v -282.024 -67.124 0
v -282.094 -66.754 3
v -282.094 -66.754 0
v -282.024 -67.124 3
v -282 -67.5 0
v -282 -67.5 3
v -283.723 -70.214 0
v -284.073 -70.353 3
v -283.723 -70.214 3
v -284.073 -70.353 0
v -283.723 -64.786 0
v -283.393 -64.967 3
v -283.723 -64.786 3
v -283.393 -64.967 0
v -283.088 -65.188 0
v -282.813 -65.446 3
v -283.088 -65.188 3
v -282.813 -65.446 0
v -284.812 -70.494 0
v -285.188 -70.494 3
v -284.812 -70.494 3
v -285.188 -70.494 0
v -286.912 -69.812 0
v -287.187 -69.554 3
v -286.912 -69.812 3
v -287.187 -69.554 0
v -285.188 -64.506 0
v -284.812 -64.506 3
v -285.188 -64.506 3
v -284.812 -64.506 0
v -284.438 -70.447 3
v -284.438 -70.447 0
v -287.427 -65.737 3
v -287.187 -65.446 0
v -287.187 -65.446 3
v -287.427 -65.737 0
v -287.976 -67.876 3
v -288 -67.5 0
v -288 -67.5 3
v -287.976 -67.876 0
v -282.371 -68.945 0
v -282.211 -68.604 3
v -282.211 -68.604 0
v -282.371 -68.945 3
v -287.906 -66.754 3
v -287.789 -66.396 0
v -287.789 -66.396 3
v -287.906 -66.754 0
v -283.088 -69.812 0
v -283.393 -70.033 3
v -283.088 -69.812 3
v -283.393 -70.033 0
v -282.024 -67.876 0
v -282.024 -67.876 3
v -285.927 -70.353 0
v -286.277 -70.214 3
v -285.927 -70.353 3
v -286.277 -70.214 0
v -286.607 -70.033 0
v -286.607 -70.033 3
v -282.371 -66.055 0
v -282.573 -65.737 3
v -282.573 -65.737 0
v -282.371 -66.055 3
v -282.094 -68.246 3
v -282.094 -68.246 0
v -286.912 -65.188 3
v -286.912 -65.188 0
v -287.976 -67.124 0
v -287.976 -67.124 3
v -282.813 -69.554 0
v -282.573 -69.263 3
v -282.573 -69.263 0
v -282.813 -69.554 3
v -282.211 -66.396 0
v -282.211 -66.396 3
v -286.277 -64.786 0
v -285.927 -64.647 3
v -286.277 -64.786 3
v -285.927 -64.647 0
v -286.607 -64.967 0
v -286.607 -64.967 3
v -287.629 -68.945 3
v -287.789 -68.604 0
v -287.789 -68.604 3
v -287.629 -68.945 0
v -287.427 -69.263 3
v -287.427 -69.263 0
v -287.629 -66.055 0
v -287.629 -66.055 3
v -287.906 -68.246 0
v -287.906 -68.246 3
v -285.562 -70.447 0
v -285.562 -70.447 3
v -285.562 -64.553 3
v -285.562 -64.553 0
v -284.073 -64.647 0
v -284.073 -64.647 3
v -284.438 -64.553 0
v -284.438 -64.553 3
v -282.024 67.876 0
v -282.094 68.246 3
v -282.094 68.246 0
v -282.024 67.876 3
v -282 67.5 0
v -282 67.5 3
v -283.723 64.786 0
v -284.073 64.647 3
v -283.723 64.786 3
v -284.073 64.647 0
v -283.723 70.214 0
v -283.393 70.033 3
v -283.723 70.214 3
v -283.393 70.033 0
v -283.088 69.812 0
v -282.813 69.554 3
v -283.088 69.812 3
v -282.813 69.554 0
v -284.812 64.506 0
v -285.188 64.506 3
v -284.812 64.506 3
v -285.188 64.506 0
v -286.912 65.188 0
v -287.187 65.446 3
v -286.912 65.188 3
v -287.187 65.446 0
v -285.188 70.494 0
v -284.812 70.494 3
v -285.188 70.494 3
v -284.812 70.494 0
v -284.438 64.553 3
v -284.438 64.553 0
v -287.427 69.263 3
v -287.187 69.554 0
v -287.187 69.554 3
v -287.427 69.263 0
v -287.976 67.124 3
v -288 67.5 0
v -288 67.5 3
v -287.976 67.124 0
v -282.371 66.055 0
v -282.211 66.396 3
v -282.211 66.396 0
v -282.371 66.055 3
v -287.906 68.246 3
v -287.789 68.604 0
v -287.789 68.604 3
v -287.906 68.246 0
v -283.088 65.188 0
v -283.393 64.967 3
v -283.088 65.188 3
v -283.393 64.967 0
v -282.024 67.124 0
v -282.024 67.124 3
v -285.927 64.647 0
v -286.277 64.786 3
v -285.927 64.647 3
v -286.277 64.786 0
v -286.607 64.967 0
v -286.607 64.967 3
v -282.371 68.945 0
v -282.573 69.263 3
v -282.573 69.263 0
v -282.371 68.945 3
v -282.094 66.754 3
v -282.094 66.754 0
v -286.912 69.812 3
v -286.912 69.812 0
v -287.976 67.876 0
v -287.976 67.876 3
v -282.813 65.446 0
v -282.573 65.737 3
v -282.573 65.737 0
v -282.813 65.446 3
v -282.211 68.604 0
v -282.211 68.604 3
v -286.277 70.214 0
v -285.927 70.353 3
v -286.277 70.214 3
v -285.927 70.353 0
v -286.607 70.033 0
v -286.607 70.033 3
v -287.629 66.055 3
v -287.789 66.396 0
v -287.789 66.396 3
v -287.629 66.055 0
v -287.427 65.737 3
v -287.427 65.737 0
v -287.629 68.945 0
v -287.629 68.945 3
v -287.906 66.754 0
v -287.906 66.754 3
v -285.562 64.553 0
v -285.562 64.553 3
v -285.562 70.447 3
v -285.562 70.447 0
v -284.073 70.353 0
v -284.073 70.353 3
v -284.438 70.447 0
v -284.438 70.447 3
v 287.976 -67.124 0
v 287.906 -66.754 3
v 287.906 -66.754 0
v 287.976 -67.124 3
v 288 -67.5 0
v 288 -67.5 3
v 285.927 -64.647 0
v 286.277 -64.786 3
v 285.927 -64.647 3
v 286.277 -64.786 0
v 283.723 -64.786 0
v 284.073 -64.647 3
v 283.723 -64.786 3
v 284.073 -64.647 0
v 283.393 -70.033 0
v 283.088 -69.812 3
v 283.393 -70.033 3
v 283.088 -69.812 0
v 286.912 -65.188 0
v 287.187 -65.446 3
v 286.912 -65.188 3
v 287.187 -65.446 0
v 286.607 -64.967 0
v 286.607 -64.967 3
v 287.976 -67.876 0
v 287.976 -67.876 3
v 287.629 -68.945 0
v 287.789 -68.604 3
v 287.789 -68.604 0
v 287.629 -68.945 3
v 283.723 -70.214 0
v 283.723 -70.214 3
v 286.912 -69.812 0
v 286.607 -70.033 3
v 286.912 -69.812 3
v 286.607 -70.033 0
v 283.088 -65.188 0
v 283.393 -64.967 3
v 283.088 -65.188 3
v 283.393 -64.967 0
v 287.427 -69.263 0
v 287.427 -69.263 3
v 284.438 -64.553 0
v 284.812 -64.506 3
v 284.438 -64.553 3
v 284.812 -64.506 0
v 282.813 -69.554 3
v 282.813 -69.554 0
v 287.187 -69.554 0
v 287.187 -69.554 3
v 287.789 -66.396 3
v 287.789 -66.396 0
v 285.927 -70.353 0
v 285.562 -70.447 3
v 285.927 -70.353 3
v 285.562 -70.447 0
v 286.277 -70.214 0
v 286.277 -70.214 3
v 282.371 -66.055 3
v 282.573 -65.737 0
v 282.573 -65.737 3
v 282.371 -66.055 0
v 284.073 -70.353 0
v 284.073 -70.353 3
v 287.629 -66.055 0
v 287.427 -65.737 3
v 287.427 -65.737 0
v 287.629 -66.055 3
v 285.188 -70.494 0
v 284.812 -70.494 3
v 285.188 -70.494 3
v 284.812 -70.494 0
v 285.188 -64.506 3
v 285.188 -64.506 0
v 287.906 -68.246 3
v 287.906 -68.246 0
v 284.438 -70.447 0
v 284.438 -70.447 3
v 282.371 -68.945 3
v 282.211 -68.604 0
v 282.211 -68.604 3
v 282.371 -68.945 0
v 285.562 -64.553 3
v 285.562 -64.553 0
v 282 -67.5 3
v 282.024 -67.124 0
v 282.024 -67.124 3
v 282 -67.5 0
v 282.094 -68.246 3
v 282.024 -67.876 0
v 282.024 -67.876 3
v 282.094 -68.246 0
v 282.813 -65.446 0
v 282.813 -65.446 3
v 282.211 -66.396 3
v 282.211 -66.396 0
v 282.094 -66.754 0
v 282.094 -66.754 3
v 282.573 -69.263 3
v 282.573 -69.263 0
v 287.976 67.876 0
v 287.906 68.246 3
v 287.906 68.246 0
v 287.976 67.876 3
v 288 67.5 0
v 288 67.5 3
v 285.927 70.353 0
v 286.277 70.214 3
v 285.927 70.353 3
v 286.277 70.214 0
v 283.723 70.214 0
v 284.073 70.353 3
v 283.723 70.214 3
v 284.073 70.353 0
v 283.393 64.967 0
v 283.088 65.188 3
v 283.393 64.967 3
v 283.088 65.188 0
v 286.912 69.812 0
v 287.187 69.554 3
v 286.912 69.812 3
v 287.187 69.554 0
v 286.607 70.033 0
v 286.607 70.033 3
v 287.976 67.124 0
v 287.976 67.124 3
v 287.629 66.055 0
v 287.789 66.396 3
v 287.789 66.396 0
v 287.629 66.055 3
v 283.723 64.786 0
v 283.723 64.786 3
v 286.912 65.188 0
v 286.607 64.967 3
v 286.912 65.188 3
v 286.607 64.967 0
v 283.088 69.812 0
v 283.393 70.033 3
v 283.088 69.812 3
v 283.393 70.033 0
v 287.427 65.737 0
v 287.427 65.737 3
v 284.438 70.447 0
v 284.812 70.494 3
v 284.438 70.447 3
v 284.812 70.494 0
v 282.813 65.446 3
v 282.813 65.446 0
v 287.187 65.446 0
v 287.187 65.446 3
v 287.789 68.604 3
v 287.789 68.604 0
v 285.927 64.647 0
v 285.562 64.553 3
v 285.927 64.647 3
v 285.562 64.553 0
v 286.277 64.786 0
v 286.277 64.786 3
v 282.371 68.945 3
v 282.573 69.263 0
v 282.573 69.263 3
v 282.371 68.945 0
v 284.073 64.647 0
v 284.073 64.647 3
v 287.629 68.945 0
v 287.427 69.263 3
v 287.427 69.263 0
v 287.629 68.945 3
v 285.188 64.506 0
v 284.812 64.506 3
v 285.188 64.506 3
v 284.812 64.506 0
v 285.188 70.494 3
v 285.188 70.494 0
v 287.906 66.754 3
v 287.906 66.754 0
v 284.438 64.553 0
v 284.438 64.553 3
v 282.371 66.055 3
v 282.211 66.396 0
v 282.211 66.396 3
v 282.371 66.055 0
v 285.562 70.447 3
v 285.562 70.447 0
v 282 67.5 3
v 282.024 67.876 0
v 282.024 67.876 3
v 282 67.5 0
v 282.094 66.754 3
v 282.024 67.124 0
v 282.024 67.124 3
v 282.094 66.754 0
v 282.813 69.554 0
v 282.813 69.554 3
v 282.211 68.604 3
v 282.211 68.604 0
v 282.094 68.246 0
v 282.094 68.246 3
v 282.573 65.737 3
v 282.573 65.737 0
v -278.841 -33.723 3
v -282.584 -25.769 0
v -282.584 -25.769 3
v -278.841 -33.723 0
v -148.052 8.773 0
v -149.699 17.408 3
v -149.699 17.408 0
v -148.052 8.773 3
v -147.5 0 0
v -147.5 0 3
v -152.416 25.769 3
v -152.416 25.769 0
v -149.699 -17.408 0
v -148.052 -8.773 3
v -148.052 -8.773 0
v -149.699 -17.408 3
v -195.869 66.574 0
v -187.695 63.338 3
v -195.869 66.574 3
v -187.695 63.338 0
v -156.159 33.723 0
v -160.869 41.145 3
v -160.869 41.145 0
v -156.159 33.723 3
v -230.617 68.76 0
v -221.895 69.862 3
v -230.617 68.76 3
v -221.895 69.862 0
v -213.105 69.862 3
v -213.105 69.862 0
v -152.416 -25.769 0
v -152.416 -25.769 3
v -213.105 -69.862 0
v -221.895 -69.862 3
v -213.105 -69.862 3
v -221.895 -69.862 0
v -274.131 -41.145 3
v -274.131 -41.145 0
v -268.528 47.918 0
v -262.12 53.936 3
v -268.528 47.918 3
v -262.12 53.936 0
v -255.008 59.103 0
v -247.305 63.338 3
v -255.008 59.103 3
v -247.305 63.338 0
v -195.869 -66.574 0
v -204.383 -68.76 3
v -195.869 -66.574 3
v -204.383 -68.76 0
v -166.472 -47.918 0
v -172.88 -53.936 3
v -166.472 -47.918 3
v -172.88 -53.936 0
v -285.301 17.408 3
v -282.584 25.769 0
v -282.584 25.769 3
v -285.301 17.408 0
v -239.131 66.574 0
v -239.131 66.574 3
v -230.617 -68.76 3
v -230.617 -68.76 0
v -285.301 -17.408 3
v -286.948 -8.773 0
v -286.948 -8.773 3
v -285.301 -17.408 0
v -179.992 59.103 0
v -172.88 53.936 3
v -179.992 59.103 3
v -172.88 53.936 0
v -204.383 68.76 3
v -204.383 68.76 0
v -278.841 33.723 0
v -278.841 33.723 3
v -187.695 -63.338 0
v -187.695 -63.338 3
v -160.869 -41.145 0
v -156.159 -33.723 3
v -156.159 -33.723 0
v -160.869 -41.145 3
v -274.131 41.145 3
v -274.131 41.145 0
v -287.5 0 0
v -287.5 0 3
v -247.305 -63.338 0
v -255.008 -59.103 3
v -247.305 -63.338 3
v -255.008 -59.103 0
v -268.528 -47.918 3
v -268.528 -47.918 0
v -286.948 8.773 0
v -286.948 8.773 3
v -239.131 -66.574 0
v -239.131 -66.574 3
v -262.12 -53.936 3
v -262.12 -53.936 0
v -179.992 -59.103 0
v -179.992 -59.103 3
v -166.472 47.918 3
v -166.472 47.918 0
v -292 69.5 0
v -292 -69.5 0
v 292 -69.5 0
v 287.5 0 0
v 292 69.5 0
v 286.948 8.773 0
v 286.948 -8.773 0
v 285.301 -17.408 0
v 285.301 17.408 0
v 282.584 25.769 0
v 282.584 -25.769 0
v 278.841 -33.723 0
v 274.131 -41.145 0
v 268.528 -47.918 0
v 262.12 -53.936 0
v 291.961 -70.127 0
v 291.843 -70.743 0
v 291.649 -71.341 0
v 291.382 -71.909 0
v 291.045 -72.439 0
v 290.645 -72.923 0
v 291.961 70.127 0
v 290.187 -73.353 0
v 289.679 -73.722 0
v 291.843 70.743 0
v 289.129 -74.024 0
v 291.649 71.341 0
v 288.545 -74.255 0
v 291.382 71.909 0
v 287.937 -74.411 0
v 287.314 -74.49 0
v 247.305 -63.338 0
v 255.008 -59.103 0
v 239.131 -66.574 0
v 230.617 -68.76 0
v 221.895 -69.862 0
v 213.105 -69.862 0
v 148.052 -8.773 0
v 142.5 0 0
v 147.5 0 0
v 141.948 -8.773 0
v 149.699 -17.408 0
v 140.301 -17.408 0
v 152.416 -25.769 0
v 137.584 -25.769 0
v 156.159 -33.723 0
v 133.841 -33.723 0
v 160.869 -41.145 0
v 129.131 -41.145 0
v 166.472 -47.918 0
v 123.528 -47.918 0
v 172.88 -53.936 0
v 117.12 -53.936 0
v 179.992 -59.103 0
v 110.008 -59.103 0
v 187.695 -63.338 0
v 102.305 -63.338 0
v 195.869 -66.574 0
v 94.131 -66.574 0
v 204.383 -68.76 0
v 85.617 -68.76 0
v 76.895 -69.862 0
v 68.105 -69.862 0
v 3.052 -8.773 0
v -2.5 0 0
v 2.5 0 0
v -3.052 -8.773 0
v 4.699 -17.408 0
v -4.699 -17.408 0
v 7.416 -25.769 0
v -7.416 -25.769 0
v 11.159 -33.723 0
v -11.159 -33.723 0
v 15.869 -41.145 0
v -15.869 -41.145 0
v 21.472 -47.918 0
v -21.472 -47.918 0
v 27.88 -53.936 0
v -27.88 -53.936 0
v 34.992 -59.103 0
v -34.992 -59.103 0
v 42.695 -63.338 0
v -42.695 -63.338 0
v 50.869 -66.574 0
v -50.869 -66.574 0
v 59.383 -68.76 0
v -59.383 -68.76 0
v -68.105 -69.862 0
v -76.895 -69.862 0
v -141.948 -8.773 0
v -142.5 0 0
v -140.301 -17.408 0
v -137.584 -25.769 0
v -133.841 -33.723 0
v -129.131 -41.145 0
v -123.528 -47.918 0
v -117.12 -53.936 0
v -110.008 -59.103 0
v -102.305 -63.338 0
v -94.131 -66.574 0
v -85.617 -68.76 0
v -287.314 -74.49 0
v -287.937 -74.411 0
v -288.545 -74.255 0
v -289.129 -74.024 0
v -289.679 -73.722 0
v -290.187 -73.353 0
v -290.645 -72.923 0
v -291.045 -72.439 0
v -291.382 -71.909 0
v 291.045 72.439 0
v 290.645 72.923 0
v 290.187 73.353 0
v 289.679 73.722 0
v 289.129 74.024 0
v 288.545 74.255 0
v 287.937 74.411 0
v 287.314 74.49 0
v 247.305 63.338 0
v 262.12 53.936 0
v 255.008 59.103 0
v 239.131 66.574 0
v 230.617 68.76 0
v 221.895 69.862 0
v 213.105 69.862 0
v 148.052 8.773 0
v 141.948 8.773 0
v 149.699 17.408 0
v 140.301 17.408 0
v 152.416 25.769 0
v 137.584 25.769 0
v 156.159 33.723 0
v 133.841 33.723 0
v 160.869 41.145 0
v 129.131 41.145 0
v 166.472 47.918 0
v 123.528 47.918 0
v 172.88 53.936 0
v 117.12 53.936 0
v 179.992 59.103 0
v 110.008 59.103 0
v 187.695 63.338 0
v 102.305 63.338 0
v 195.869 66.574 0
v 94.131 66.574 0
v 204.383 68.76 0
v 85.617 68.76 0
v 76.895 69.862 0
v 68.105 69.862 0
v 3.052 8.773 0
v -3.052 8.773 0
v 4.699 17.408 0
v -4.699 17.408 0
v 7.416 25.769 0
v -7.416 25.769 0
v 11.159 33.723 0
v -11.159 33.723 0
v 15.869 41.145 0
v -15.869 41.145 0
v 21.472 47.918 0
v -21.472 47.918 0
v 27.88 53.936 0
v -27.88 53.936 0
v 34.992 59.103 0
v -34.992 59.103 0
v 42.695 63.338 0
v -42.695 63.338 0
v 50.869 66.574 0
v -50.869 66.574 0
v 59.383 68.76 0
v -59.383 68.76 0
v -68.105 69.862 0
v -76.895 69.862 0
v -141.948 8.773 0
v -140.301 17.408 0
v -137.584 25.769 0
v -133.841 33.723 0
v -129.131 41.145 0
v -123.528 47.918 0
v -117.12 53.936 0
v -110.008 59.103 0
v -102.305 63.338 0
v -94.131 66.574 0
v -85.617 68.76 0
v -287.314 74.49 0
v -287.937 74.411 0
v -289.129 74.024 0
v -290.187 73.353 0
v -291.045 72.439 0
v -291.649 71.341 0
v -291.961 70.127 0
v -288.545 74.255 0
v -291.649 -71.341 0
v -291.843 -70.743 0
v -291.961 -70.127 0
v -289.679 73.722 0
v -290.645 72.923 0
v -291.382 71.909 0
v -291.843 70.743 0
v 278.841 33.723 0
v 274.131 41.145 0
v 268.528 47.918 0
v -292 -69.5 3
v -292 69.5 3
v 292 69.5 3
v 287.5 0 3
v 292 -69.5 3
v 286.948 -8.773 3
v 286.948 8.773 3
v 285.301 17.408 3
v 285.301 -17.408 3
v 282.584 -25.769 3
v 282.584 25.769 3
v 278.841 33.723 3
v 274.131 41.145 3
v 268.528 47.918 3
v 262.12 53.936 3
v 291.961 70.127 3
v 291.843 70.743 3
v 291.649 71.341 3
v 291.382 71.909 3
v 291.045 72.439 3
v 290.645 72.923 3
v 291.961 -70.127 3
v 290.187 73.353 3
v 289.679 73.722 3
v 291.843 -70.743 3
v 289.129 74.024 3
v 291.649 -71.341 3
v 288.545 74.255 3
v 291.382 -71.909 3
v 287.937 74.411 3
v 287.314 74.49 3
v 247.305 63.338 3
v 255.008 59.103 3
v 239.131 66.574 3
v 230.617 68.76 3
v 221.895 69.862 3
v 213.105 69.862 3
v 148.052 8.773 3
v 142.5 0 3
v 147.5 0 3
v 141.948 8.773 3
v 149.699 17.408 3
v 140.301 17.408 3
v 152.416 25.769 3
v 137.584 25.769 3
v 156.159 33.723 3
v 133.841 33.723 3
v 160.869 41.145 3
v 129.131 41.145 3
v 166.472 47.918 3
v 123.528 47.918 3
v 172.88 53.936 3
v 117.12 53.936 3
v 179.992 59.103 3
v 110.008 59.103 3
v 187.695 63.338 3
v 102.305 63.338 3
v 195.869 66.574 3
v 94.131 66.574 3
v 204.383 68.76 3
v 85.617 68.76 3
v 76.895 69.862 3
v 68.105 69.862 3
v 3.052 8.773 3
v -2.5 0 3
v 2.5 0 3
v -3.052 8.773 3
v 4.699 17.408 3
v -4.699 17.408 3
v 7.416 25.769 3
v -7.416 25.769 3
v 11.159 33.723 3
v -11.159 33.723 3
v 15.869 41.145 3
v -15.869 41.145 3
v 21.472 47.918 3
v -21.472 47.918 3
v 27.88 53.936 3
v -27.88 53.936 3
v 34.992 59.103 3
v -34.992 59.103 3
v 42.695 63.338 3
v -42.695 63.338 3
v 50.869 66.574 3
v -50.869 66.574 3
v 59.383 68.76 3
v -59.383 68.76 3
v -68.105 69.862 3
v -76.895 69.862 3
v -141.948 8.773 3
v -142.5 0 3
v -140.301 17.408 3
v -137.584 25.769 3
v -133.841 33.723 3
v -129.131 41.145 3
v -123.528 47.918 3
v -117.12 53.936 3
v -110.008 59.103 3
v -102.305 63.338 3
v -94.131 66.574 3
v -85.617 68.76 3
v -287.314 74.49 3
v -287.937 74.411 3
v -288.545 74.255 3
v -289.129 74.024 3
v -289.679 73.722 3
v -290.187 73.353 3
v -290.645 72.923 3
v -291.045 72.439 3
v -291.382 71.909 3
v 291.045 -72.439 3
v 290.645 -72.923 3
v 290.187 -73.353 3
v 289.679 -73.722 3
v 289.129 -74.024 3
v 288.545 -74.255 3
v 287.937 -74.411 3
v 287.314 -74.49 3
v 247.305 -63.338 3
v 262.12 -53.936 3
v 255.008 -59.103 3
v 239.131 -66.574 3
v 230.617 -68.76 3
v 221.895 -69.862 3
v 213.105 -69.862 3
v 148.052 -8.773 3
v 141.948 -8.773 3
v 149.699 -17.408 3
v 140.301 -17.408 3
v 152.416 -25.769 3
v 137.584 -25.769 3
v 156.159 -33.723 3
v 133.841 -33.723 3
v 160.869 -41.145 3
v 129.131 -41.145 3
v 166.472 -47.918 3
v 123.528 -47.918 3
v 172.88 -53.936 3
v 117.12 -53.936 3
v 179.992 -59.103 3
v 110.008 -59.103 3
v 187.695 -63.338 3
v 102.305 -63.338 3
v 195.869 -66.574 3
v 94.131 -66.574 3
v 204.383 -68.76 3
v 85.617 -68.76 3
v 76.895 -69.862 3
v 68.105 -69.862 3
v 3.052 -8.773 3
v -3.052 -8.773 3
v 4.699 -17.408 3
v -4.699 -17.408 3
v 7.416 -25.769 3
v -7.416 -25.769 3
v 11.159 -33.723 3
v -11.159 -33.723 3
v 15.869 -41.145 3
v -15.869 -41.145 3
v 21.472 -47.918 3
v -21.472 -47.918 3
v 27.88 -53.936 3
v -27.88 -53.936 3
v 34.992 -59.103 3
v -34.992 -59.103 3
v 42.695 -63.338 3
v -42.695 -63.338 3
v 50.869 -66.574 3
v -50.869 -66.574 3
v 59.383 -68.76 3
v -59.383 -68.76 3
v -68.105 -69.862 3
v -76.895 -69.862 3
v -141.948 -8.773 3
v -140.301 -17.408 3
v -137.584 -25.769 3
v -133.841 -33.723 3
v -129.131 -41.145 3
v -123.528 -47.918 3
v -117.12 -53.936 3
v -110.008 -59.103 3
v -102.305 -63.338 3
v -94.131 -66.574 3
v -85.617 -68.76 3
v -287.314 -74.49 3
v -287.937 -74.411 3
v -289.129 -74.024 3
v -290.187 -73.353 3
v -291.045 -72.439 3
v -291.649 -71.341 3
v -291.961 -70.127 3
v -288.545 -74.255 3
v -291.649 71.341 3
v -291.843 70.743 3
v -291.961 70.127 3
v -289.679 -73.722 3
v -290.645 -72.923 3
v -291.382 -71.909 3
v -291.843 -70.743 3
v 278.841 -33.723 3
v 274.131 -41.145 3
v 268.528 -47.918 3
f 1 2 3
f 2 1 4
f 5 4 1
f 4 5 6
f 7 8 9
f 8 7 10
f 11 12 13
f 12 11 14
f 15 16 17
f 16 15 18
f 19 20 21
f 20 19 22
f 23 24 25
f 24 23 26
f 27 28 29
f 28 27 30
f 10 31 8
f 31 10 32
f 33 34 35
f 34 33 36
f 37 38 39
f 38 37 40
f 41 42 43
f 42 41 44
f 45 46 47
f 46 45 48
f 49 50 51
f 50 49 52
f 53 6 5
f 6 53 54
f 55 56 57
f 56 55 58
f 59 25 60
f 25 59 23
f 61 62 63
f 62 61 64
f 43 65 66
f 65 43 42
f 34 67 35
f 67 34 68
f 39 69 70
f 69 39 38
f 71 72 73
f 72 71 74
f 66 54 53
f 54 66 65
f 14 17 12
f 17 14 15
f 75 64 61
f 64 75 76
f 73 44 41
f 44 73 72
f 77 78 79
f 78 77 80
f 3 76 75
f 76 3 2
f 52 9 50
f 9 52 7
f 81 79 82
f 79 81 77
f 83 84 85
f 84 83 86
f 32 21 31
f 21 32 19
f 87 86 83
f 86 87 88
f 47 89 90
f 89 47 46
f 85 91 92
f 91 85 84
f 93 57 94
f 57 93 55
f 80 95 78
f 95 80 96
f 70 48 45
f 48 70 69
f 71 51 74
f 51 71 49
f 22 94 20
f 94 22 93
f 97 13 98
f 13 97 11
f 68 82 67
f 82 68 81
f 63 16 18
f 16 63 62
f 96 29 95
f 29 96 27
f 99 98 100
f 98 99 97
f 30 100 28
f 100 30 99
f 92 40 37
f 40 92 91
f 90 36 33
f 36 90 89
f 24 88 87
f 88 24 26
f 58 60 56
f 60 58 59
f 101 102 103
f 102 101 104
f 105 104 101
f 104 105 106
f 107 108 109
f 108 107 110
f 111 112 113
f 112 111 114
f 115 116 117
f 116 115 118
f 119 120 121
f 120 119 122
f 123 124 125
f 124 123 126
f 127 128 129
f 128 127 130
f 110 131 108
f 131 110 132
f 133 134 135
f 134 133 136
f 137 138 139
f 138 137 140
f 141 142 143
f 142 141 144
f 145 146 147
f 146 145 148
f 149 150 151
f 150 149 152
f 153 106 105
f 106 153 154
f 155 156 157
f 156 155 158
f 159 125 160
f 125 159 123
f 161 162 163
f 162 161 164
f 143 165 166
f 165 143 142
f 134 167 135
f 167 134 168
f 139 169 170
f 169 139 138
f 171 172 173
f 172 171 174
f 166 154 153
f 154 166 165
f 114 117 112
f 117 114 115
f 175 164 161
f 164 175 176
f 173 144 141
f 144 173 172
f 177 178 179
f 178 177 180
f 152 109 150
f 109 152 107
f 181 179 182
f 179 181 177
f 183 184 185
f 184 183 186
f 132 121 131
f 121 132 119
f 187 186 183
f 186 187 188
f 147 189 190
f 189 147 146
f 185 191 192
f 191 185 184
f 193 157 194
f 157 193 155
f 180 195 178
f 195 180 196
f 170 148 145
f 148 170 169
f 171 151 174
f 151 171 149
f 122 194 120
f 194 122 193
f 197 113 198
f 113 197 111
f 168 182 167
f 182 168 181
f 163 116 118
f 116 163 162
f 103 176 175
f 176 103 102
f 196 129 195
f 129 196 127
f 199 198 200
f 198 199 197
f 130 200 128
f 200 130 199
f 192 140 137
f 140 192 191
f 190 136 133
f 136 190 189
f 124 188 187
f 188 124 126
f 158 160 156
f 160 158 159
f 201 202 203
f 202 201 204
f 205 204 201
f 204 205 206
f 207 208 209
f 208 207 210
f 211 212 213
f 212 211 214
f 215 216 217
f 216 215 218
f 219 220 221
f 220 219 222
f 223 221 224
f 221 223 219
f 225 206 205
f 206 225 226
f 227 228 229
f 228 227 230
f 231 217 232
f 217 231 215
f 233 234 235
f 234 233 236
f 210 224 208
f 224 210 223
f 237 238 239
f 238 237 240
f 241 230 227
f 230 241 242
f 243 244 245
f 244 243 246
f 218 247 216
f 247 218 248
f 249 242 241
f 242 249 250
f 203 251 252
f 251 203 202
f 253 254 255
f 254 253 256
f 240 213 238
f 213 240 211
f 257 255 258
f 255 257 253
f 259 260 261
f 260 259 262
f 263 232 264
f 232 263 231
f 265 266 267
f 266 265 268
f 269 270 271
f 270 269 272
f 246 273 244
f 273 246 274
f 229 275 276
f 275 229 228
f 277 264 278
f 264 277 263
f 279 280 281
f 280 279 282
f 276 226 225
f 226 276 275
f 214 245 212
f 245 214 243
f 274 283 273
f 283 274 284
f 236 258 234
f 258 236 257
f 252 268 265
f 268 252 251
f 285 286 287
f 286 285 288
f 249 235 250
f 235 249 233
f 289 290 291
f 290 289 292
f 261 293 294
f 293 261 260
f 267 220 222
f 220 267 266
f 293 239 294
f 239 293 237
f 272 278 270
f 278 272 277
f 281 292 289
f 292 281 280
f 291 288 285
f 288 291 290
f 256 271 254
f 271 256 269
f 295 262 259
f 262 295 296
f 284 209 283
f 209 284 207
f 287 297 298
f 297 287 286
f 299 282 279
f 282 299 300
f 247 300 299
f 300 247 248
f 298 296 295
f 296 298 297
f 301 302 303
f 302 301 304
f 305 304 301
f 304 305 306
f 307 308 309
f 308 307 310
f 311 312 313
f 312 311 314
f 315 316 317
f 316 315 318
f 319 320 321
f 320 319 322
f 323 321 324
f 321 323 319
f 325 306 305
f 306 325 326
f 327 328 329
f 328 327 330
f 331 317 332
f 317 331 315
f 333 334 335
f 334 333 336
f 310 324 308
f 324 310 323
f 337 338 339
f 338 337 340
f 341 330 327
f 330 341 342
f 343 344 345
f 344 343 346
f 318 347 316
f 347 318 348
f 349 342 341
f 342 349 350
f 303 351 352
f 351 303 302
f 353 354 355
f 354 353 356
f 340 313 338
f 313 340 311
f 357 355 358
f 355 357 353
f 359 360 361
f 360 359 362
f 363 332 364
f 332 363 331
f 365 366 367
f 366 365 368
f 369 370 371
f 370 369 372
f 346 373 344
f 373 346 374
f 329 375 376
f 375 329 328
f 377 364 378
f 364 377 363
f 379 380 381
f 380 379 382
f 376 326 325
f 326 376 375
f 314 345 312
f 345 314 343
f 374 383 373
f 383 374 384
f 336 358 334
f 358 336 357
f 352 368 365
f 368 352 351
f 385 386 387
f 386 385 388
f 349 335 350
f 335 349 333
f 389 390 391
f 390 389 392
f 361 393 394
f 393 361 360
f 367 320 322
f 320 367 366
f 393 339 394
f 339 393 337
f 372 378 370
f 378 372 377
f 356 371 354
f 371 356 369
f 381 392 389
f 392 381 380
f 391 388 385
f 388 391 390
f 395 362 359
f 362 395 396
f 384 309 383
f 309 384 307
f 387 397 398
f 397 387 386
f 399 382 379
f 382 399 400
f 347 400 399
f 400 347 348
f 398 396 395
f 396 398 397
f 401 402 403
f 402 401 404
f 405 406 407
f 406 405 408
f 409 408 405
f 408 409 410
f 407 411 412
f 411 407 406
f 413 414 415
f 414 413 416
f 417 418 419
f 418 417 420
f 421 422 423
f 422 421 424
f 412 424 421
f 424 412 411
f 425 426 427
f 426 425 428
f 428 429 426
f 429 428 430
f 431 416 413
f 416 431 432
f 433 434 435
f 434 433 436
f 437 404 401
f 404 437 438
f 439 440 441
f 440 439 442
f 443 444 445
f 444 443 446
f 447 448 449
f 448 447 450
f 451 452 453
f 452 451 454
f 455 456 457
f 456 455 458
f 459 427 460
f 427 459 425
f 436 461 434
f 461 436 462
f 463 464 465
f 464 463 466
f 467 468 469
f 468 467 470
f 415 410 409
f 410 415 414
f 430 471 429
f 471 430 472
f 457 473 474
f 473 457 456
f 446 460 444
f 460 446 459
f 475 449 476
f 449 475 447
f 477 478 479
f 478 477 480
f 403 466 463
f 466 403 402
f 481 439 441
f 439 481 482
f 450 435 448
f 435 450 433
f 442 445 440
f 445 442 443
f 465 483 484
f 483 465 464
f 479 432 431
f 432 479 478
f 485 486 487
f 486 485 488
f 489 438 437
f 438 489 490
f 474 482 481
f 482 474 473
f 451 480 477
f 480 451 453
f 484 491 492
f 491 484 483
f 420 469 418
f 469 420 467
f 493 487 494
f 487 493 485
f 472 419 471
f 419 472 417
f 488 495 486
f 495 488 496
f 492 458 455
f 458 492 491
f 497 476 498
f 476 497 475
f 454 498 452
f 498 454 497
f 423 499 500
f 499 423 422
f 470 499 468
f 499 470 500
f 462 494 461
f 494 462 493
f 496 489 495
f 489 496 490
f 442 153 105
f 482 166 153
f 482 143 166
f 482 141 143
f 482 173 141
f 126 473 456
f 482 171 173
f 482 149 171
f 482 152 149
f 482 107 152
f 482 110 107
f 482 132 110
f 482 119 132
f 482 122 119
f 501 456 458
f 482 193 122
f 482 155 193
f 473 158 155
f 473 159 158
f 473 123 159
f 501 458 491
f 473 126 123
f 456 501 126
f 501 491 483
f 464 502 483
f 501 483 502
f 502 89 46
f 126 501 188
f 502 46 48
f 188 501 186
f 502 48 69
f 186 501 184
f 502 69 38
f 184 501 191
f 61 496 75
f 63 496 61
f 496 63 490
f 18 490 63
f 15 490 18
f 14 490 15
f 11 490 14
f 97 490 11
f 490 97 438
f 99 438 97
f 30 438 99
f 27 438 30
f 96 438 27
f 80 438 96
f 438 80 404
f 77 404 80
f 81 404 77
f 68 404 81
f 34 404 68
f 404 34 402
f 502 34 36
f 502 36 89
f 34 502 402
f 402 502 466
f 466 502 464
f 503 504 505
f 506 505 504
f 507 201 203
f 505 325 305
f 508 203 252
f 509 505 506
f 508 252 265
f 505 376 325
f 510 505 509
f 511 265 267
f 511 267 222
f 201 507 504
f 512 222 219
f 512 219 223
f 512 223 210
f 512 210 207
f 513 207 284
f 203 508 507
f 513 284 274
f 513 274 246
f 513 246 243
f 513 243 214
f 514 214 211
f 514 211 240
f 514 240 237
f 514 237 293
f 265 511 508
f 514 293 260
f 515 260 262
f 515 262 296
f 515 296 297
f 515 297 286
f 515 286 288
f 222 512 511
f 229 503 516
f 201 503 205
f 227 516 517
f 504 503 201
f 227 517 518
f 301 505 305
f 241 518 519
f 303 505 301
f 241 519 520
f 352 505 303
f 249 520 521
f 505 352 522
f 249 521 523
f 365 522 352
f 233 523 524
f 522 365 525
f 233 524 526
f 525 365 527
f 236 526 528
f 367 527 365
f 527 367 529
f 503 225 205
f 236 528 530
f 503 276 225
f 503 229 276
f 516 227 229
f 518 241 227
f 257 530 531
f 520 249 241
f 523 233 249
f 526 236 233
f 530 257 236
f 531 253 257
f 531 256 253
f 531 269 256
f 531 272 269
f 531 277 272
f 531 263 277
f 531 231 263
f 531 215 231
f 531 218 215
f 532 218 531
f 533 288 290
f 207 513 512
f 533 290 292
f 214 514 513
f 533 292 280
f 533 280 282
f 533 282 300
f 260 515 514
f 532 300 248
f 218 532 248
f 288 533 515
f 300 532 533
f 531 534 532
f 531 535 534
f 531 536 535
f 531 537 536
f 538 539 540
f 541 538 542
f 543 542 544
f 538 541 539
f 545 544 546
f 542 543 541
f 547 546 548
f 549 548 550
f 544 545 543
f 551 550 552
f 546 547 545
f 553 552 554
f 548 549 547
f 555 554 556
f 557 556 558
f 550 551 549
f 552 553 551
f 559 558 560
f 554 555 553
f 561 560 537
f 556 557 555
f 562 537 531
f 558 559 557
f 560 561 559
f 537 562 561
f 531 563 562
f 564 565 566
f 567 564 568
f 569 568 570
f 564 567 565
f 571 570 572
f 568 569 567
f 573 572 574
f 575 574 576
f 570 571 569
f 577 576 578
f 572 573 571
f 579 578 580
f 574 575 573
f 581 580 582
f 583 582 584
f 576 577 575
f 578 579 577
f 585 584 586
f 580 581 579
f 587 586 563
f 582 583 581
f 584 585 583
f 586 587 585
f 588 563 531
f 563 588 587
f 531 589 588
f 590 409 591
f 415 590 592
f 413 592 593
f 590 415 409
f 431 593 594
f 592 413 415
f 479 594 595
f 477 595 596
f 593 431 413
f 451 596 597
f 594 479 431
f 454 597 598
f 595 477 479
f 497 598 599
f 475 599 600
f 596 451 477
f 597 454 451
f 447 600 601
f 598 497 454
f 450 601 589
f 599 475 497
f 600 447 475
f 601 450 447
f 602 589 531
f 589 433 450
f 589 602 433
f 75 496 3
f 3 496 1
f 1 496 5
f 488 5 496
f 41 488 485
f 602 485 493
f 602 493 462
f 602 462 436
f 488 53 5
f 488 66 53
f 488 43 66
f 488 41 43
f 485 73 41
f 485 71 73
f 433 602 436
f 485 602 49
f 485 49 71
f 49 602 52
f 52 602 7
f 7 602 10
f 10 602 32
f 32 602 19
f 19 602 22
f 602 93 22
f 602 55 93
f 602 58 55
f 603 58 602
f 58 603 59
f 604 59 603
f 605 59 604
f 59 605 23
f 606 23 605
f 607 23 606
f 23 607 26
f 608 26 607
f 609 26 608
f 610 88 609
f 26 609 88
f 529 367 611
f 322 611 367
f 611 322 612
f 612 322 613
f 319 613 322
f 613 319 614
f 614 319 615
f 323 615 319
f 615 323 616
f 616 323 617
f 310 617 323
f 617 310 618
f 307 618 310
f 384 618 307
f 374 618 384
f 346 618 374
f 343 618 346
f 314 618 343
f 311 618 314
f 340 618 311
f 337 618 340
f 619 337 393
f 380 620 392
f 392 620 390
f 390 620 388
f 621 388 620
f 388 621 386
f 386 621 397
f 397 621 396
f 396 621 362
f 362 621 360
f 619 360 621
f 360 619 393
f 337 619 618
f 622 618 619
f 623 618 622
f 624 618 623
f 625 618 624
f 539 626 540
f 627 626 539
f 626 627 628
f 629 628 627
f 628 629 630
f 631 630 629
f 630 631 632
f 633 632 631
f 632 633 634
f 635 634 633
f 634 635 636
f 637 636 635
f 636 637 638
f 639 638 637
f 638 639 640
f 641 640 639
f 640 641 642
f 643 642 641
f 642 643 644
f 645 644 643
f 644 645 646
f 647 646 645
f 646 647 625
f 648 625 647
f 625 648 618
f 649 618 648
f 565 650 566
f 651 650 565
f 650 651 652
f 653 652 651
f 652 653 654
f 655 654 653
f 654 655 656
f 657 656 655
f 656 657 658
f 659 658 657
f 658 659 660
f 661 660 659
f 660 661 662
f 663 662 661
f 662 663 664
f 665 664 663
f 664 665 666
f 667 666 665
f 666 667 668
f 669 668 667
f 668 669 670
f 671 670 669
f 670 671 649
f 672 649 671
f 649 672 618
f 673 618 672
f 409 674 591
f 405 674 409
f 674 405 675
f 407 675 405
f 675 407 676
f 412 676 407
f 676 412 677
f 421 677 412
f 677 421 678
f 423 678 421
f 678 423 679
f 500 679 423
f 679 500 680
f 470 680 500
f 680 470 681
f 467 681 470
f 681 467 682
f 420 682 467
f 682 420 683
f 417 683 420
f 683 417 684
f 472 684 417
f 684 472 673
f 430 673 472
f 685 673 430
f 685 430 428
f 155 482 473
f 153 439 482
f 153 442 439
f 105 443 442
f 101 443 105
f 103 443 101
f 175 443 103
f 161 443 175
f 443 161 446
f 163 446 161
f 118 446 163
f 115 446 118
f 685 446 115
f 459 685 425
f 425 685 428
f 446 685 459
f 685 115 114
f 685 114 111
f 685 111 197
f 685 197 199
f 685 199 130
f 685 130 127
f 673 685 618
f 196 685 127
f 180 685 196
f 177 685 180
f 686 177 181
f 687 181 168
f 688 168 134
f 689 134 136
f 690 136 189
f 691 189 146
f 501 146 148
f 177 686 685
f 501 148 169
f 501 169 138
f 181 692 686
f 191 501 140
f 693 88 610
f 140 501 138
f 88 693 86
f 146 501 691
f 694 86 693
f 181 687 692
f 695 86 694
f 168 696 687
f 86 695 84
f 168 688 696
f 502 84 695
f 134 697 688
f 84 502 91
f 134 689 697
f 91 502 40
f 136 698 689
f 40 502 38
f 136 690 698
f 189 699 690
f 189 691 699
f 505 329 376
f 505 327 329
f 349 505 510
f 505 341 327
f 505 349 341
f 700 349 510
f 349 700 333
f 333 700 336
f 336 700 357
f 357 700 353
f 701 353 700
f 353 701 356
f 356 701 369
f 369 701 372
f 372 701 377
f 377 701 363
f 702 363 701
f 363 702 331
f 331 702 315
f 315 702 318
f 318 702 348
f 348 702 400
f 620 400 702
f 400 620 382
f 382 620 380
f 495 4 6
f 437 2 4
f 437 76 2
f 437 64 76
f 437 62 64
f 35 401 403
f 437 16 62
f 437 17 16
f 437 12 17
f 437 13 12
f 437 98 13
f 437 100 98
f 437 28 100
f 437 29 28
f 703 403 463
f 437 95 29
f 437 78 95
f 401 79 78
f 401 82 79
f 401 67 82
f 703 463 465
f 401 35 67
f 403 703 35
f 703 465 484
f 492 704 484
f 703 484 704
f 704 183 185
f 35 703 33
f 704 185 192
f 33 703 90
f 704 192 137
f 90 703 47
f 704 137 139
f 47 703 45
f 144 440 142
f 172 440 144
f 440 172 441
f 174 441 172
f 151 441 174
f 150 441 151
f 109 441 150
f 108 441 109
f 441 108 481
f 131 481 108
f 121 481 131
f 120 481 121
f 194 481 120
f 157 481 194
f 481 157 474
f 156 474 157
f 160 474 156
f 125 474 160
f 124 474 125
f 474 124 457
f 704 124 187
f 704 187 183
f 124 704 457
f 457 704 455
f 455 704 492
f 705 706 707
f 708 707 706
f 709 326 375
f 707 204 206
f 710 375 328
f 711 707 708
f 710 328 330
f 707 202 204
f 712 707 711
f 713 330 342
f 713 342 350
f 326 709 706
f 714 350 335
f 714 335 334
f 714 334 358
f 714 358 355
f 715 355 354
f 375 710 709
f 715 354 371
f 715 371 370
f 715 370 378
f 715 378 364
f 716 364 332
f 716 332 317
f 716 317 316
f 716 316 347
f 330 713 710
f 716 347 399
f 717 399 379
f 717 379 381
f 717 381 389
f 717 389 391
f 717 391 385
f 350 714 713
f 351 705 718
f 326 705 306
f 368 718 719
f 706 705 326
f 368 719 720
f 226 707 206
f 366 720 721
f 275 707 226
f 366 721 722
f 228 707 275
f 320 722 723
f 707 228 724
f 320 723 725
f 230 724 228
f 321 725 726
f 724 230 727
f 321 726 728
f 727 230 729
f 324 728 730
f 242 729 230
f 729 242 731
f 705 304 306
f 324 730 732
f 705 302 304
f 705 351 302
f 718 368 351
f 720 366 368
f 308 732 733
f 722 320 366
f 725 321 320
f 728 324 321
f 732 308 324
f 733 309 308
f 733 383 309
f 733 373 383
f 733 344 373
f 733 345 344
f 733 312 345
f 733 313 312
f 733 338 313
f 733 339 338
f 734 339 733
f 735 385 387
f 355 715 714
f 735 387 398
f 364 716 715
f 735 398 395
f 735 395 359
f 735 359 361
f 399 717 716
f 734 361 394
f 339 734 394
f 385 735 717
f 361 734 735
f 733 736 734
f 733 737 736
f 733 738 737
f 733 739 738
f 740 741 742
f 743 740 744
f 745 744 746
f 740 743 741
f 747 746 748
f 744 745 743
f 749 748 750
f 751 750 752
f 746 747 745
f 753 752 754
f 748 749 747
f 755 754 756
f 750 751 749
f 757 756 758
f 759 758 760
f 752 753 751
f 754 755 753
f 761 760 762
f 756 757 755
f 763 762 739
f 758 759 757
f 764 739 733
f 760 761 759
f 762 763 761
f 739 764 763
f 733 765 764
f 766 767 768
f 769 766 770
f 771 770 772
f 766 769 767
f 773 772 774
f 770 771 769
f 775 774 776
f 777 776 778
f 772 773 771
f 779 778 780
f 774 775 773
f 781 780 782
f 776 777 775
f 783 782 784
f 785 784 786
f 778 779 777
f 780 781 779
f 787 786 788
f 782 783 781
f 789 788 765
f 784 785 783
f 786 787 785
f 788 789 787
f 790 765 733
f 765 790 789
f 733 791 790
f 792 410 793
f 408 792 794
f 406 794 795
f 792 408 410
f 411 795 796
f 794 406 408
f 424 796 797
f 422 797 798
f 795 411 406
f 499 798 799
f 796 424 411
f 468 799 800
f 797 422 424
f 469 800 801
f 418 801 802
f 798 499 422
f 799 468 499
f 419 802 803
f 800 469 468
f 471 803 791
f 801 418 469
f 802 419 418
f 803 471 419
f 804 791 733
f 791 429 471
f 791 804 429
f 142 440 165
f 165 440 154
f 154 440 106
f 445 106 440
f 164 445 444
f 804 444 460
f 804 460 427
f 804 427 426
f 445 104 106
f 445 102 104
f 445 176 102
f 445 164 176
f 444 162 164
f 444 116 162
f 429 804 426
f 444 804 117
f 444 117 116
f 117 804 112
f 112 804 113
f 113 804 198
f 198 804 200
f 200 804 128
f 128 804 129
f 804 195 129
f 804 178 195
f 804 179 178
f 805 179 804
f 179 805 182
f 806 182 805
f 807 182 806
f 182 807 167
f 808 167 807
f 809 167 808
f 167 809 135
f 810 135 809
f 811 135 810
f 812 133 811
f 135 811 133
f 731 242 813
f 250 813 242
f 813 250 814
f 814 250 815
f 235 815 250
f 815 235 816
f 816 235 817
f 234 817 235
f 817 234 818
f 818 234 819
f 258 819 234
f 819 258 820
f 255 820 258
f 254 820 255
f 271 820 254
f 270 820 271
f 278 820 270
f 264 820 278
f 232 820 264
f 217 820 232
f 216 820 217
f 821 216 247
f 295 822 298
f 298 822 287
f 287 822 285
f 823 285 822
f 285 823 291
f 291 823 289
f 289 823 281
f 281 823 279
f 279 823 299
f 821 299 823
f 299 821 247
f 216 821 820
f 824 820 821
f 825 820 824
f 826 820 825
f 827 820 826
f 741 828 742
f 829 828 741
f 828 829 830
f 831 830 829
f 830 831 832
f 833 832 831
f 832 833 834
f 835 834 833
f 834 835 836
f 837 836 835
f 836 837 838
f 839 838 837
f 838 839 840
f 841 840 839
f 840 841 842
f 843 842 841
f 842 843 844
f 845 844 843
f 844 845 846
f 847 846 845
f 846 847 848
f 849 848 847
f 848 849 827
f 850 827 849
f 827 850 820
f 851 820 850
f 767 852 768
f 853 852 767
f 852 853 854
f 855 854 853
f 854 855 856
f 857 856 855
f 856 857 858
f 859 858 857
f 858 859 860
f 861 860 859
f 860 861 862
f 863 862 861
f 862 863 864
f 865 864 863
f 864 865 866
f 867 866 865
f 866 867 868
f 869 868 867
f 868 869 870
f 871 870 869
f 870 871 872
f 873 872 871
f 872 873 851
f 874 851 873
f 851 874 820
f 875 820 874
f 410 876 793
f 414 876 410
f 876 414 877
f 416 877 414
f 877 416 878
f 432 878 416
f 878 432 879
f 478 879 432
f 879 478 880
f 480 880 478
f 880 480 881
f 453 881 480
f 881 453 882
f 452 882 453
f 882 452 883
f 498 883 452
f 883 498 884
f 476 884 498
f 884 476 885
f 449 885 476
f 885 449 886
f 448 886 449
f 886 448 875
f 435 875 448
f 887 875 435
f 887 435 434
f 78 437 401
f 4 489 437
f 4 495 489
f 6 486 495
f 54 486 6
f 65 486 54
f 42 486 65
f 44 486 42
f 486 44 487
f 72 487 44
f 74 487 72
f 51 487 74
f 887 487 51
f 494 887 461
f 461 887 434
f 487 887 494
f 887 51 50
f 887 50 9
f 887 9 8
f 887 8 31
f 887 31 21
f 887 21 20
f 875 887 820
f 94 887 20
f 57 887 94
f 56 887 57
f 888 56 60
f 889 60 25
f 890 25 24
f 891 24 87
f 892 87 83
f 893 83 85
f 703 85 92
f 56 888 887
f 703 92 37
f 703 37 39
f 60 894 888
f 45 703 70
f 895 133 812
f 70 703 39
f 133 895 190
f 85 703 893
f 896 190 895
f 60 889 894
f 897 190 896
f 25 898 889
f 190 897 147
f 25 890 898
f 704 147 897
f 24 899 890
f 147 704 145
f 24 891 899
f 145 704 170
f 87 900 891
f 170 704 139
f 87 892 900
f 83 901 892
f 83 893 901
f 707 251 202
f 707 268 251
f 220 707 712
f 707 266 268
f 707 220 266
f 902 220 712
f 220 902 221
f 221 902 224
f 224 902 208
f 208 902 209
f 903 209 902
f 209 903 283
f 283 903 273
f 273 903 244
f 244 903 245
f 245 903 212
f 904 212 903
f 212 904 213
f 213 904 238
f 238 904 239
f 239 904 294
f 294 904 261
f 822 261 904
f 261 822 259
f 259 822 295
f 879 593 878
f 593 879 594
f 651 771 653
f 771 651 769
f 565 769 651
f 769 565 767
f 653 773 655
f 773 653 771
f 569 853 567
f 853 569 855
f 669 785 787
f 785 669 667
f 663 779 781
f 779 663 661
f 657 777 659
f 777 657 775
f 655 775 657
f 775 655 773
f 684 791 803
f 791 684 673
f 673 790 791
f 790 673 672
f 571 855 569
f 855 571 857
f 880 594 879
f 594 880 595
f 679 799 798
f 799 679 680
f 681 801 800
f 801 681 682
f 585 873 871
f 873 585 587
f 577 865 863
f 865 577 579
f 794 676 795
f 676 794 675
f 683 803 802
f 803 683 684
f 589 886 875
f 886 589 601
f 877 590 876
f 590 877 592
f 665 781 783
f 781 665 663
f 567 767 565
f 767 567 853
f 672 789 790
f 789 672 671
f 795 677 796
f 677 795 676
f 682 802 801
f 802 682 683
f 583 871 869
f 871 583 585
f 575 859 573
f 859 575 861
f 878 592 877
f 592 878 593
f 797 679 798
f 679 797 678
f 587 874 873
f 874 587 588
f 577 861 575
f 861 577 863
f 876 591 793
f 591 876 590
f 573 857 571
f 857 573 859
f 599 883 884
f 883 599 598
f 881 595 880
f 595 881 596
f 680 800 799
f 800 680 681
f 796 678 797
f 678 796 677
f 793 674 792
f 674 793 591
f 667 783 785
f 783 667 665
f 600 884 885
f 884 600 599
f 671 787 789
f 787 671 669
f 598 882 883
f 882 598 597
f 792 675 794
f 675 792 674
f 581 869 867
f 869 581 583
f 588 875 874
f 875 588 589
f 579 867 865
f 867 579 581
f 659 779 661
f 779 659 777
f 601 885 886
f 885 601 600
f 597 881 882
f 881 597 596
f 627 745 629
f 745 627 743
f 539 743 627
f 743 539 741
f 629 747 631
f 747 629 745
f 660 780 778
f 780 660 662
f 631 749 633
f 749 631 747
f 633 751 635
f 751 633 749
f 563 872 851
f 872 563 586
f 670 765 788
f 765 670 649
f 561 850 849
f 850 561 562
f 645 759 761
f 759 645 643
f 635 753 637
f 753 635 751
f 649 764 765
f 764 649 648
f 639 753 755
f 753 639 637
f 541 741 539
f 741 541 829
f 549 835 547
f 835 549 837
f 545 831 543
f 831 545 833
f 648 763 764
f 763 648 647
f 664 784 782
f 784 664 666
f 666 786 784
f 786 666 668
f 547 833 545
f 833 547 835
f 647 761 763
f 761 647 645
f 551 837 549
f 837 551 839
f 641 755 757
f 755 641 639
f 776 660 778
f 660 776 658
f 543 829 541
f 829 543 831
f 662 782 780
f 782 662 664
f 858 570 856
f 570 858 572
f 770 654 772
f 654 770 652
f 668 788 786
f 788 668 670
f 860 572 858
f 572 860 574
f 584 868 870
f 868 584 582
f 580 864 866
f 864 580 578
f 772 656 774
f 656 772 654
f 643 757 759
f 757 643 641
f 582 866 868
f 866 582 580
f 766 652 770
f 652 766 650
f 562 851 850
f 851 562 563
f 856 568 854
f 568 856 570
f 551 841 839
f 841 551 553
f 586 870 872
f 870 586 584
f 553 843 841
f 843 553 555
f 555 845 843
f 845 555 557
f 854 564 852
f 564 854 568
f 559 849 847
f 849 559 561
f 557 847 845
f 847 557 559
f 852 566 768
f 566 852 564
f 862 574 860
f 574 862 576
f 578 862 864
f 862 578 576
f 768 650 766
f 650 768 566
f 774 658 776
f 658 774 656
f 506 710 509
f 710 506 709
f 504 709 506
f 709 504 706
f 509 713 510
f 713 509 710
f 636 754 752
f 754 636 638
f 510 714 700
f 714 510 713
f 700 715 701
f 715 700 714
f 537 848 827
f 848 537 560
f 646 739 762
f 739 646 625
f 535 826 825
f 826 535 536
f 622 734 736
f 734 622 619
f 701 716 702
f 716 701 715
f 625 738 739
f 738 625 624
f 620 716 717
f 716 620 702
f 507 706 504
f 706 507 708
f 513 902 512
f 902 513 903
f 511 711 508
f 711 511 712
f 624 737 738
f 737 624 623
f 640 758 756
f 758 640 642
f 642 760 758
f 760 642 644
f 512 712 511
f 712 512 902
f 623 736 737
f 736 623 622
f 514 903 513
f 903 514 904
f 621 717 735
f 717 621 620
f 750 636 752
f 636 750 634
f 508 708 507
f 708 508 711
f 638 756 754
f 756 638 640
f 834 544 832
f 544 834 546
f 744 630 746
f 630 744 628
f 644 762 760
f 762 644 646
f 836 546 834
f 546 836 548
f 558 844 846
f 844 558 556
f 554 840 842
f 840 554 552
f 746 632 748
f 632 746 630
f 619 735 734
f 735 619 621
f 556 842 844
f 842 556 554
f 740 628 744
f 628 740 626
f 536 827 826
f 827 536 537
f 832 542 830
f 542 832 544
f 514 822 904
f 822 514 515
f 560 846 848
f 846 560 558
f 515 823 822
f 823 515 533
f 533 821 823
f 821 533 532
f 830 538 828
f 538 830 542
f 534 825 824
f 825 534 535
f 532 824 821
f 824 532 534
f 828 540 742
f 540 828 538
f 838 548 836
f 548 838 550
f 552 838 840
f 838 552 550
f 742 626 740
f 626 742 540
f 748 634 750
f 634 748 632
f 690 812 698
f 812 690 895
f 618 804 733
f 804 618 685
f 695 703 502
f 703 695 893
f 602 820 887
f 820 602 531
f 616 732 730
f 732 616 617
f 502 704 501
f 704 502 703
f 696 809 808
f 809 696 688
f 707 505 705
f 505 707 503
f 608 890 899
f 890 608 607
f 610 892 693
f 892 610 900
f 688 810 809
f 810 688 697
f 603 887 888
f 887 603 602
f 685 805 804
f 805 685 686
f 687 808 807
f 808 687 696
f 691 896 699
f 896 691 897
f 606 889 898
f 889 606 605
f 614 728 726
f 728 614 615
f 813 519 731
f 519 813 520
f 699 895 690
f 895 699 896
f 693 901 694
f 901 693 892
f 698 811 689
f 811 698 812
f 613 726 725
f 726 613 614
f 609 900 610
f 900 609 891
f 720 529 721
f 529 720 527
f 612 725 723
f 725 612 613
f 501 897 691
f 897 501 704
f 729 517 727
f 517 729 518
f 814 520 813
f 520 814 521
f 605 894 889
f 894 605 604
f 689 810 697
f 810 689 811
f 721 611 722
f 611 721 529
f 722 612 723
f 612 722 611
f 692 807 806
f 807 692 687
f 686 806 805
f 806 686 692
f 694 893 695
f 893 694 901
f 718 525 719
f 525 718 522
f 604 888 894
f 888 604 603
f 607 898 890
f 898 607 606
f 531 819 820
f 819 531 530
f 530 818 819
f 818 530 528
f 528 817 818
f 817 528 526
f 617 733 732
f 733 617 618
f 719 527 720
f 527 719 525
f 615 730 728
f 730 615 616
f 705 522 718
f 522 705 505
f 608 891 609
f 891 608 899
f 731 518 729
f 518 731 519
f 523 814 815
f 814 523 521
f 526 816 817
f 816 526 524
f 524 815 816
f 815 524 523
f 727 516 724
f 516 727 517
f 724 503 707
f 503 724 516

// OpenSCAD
$fn = 50;


difference() {
	union() {
		hull() {
			translate(v = [-287.0000000000, 69.5000000000, 0]) {
				cylinder(h = 3, r = 5);
			}
			translate(v = [287.0000000000, 69.5000000000, 0]) {
				cylinder(h = 3, r = 5);
			}
			translate(v = [-287.0000000000, -69.5000000000, 0]) {
				cylinder(h = 3, r = 5);
			}
			translate(v = [287.0000000000, -69.5000000000, 0]) {
				cylinder(h = 3, r = 5);
			}
		}
	}
	union() {
		#translate(v = [-285.0000000000, -67.5000000000, -100.0000000000]) {
			cylinder(h = 200, r = 3.0000000000);
		}
		#translate(v = [-285.0000000000, 67.5000000000, -100.0000000000]) {
			cylinder(h = 200, r = 3.0000000000);
		}
		#translate(v = [285.0000000000, -67.5000000000, -100.0000000000]) {
			cylinder(h = 200, r = 3.0000000000);
		}
		#translate(v = [285.0000000000, 67.5000000000, -100.0000000000]) {
			cylinder(h = 200, r = 3.0000000000);
		}
		#translate(v = [-217.5000000000, 0, 0]) {
			cylinder(h = 3, r = 70.0000000000);
		}
		#translate(v = [-72.5000000000, 0, 0]) {
			cylinder(h = 3, r = 70.0000000000);
		}
		#translate(v = [72.5000000000, 0, 0]) {
			cylinder(h = 3, r = 70.0000000000);
		}
		#translate(v = [217.5000000000, 0, 0]) {
			cylinder(h = 3, r = 70.0000000000);
		}
	}
}
